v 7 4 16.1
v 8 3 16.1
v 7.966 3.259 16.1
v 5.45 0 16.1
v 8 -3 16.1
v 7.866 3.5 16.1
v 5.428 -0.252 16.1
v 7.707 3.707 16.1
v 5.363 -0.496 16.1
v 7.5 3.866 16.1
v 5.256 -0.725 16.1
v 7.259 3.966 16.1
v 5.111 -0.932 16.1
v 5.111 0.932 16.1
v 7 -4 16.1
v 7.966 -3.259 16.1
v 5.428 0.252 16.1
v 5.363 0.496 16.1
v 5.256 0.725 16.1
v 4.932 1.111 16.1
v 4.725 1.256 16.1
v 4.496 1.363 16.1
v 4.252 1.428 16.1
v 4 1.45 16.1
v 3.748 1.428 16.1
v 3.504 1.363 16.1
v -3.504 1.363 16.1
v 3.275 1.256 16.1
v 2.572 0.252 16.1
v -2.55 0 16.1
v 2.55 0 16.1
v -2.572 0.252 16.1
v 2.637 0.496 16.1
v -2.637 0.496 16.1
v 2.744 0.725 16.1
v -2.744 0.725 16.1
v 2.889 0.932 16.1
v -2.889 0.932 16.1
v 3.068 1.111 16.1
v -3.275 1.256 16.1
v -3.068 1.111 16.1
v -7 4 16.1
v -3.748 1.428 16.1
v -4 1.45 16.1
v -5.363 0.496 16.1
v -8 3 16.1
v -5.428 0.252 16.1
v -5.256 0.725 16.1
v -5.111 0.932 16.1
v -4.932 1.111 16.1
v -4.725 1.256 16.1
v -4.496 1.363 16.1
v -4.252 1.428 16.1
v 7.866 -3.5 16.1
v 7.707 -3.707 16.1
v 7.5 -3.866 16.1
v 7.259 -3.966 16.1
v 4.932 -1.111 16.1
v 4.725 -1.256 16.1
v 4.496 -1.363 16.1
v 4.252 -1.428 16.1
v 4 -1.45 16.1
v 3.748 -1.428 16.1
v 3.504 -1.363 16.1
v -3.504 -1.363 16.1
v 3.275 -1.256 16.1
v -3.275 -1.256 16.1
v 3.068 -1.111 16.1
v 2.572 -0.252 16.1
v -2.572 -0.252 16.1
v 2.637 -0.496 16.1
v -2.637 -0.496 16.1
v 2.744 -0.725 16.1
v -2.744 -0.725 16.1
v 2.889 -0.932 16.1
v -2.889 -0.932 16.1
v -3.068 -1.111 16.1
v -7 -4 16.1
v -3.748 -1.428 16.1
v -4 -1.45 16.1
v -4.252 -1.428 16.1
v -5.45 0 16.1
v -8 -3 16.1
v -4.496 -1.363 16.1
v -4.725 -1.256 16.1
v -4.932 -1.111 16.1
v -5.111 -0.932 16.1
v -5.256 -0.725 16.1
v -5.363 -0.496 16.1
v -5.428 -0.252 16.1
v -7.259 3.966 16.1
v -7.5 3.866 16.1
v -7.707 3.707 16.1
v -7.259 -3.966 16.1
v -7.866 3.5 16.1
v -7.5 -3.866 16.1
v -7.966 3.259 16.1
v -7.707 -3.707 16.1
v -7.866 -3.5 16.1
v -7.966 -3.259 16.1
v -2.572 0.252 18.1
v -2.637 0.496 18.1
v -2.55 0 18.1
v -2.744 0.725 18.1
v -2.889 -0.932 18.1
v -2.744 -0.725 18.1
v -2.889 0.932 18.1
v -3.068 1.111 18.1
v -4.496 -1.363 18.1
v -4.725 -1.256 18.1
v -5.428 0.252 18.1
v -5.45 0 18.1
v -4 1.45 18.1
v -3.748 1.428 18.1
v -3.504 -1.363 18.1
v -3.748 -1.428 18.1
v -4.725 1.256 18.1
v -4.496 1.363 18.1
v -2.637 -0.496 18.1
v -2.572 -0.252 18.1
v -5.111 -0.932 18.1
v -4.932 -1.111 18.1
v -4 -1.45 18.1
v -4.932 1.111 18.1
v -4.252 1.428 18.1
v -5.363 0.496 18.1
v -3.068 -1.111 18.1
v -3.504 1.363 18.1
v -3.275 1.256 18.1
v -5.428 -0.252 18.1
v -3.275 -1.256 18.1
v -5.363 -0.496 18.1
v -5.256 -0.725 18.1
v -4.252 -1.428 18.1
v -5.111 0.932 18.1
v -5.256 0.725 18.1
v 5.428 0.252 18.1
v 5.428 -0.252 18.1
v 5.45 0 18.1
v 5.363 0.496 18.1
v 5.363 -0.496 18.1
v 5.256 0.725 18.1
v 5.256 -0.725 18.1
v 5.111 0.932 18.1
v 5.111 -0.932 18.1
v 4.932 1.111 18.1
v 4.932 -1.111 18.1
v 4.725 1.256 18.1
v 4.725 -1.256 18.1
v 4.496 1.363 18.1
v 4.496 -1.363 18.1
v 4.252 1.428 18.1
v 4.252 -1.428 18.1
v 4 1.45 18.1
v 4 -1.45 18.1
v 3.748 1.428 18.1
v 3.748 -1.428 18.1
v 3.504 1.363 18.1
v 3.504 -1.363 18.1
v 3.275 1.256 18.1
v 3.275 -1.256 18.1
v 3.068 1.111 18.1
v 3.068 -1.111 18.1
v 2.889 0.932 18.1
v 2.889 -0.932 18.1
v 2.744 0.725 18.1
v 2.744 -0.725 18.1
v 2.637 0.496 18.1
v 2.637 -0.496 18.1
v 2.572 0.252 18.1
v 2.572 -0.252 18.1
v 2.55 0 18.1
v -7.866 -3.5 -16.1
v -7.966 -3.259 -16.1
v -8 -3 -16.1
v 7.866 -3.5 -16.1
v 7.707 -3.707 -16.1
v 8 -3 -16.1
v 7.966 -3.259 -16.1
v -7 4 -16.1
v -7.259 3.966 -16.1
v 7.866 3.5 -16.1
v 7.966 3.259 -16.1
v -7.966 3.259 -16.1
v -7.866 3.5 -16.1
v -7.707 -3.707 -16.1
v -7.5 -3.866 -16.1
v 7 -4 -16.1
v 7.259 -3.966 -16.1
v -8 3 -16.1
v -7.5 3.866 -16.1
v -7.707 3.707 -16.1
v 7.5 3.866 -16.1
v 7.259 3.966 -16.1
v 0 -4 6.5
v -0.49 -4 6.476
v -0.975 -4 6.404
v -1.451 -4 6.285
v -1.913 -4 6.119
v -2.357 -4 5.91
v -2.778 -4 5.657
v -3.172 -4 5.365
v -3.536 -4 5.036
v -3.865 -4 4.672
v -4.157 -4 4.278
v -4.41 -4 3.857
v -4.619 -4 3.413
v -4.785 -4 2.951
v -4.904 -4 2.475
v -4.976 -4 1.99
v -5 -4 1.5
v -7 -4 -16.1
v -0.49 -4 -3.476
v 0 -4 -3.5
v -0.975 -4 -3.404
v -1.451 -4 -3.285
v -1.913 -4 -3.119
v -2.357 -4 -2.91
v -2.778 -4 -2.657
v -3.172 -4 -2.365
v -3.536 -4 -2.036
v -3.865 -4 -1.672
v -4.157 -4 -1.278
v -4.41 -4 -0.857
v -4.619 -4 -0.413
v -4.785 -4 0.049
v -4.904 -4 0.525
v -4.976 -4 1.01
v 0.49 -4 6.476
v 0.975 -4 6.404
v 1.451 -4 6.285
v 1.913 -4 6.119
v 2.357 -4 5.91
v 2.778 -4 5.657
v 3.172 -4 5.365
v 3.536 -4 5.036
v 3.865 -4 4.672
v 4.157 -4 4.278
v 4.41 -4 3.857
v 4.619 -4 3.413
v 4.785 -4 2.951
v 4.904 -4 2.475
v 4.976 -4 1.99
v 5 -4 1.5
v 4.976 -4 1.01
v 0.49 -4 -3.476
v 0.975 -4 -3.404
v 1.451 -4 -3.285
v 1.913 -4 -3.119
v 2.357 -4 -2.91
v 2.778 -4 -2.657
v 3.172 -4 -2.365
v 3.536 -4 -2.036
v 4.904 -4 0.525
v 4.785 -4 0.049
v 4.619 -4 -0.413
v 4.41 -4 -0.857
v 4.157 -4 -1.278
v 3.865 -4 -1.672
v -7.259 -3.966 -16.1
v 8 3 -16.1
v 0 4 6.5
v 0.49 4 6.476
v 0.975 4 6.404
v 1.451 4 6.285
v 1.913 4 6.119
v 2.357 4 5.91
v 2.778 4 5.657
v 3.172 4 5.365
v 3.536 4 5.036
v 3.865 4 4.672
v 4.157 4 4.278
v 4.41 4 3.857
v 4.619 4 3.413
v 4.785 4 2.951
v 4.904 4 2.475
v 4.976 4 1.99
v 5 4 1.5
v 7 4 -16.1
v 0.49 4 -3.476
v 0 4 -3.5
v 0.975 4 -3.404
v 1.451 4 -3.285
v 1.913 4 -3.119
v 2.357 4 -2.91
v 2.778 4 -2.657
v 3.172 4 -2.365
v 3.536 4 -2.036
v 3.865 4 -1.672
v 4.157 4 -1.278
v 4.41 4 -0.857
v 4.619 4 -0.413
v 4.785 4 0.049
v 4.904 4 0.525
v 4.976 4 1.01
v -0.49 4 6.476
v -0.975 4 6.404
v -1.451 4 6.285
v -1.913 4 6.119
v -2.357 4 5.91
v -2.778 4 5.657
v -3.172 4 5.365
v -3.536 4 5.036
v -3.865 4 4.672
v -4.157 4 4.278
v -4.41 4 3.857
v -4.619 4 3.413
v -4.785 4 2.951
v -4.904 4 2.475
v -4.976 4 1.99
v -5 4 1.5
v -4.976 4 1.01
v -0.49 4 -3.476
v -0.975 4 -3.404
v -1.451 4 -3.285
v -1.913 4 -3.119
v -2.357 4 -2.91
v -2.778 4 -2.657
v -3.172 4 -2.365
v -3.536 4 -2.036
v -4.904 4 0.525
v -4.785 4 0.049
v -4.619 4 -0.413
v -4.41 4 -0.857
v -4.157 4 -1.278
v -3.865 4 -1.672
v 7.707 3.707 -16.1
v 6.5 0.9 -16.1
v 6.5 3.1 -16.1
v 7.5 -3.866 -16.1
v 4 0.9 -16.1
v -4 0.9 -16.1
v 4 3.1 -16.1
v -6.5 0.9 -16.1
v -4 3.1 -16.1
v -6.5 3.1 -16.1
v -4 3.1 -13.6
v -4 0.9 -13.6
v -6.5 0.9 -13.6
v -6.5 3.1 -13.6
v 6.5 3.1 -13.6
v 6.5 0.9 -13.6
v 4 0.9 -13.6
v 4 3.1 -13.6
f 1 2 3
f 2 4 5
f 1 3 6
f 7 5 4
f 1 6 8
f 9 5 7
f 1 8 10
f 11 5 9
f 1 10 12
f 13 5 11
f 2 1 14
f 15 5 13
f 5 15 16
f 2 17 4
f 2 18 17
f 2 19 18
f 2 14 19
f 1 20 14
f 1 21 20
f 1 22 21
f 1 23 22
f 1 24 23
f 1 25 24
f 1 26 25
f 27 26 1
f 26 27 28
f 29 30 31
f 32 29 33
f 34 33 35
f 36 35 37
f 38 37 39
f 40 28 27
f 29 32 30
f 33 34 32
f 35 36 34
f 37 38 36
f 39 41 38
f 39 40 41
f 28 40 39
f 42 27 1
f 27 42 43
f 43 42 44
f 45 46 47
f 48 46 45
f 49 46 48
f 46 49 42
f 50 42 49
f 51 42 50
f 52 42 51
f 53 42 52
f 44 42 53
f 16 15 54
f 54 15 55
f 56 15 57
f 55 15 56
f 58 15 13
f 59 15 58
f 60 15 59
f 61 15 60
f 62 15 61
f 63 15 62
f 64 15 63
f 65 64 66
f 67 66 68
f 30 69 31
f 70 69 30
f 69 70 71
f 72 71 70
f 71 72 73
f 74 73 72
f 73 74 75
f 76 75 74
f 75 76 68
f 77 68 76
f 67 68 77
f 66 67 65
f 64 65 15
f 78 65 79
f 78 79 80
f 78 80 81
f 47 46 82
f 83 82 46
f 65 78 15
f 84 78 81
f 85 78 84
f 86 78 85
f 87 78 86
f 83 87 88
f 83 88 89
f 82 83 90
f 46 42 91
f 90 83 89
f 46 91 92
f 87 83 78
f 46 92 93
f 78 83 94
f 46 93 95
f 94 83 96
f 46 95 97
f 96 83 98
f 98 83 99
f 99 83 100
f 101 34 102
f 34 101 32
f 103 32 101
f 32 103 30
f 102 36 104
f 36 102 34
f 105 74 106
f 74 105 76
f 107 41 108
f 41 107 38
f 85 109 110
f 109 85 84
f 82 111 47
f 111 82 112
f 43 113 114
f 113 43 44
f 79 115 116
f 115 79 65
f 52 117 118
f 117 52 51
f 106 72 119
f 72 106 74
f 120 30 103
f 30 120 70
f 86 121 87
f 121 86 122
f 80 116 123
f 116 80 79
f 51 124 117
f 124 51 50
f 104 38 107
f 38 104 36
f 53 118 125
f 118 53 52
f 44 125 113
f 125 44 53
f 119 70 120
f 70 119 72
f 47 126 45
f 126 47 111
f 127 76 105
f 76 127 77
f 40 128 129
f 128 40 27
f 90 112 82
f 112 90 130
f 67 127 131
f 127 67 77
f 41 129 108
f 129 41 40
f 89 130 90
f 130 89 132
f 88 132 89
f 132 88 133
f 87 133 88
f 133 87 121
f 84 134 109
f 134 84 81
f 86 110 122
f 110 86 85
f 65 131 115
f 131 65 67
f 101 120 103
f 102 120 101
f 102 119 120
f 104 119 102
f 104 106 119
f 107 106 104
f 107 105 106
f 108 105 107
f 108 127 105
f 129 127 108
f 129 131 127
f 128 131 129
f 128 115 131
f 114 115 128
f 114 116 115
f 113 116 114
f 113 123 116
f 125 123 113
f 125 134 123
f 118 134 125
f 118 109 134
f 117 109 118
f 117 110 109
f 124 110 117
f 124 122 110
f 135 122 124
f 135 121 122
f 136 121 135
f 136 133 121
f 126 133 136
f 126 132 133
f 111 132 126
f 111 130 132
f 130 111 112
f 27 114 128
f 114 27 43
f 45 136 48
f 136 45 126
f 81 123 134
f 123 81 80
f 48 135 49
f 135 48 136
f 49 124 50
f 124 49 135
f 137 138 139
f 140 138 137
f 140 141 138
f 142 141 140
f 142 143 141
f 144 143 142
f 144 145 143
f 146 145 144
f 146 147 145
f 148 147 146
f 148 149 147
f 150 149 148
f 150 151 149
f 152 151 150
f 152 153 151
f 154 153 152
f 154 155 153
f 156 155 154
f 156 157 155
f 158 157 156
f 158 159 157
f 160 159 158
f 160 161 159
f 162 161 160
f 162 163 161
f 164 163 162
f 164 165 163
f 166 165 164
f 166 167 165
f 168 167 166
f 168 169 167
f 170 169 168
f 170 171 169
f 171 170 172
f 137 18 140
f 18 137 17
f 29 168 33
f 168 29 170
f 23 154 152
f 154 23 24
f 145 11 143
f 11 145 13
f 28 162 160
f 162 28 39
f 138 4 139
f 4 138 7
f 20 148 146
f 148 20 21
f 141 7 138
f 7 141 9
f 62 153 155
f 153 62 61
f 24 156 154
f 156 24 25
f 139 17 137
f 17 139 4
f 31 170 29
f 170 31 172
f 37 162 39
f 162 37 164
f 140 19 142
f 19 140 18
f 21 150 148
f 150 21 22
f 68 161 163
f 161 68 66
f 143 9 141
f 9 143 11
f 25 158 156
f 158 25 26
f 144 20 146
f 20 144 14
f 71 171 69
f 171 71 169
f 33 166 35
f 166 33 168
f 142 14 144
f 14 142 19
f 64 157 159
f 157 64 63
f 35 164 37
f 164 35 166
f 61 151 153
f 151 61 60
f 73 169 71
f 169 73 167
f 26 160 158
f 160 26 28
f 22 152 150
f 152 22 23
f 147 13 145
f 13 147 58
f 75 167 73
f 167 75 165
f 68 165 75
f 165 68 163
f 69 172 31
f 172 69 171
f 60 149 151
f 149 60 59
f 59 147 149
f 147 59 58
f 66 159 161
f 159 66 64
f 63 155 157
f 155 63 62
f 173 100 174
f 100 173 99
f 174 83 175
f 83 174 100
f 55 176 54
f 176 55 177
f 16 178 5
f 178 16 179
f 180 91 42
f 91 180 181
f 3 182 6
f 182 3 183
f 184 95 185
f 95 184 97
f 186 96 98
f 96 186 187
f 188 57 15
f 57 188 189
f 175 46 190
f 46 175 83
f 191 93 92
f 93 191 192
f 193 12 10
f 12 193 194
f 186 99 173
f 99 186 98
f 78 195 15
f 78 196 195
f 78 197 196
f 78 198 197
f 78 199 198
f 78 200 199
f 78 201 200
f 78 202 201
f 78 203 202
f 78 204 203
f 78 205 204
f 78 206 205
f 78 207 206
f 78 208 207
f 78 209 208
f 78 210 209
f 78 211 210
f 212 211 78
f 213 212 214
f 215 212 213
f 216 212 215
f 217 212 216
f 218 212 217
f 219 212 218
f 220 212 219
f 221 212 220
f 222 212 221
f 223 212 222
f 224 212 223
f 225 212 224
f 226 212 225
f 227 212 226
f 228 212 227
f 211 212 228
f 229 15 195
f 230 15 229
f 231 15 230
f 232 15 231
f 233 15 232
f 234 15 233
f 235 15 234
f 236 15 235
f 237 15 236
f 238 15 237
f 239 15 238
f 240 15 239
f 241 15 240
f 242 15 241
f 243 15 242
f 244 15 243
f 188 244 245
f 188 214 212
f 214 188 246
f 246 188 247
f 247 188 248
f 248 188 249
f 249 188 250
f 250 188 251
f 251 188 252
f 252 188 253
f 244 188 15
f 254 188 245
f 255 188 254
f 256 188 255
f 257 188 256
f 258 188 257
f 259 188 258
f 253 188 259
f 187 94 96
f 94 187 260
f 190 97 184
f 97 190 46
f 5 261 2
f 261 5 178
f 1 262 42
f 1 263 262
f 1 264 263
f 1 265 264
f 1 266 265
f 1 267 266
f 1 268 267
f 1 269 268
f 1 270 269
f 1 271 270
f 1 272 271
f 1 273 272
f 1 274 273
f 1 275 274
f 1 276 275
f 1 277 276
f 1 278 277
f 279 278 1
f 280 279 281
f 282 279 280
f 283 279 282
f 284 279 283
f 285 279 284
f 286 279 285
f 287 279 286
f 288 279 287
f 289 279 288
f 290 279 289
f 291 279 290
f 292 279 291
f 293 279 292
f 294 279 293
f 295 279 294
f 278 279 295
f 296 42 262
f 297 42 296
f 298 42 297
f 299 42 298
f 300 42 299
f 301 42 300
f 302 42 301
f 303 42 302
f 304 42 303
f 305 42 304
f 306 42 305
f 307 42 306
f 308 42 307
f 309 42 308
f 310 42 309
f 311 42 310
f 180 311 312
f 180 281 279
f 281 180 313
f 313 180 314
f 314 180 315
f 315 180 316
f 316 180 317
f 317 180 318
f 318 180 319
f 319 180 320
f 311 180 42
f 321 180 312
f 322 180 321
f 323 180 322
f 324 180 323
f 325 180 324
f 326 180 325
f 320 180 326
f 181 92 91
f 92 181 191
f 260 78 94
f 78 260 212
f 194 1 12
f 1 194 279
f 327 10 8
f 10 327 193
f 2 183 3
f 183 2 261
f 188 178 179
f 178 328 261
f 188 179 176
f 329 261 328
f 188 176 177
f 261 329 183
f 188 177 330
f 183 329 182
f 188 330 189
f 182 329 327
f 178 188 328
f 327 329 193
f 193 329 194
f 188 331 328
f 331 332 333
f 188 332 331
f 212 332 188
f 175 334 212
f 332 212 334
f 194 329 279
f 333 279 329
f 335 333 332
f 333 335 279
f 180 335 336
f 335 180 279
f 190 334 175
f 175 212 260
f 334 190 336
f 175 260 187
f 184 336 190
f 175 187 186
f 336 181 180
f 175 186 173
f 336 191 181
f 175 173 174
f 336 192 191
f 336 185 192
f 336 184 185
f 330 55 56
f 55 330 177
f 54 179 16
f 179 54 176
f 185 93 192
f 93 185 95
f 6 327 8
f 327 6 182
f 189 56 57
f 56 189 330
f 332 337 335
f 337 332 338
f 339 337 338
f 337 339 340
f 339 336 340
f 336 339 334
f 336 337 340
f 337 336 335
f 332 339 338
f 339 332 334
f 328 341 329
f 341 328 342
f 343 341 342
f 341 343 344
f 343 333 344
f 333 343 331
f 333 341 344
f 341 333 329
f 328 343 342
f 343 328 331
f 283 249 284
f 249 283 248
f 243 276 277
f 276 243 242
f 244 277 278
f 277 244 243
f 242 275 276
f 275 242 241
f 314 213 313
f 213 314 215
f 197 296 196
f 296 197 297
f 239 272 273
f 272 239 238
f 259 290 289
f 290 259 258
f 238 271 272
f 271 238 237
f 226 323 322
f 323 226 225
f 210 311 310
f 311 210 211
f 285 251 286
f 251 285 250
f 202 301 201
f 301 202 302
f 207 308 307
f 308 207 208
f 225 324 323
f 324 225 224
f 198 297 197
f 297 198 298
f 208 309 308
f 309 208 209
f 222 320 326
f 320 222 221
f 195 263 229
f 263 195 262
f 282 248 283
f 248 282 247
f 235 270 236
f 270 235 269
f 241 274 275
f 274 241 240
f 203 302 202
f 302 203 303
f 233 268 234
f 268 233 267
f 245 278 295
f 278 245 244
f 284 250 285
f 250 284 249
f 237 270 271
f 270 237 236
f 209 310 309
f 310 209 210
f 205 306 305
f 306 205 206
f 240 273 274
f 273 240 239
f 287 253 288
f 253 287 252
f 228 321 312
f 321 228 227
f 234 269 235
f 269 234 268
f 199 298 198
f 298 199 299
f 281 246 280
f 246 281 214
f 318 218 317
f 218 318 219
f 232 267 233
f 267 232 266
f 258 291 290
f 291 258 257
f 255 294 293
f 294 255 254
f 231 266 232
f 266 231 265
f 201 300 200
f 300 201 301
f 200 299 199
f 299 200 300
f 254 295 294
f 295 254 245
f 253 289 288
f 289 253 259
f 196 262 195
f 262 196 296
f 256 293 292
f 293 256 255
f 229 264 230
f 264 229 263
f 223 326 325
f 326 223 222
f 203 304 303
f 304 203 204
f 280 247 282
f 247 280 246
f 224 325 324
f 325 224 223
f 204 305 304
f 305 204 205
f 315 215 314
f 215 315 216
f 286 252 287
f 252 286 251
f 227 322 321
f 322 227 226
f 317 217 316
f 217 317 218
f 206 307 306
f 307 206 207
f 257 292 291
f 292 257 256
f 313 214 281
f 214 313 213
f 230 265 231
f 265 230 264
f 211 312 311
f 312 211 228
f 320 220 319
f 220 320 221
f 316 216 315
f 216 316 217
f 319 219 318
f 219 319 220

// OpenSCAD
// Part A4: block with transverse bore and top pins.
// SPDX-License-Identifier: MIT
//
// Local origin convention:
// - XY origin is the body centerline.
// - Z origin is the body midplane, excluding the top pins.
// - Assembly placement and animation should be applied outside this file.

module a4_body_2d(w = 16, d = 8, corner_r = 1.0) {
    // First correction pass: rectangular body with softened corners.
    // End-form contour (R8 callout behavior) can be refined in a later pass.
    hull() {
        for (sx = [-1, 1], sy = [-1, 1])
            translate([sx * (w / 2 - corner_r), sy * (d / 2 - corner_r)])
                circle(r = corner_r, $fn = 24);
    }
}

module part_a4(
    w = 16,
    d = 8,
    body_h = 32.2,
    top_pin_d = 2.9,
    top_pin_h = 2.0,
    pin_spacing = 8.0,
    bore_d = 10.0,
    bore_center_z = 17.6,
    lower_cut_h = 2.5,
    lower_cut_w = 2.5,
    lower_cut_depth = 2.0,
    lower_cut_gap = 8.0,
    corner_r = 1.0
) {
    z_min = -body_h / 2;

    difference() {
        union() {
            // Main block
            translate([0, 0, z_min])
                linear_extrude(height = body_h)
                a4_body_2d(w = w, d = d, corner_r = corner_r);

            // Two top protruding bosses (were incorrectly modeled as holes).
            for (x = [-pin_spacing / 2, pin_spacing / 2])
                translate([x, 0, z_min + body_h])
                    cylinder(d = top_pin_d, h = top_pin_h, center = false, $fn = 36);
        }

        // Main transverse bore (dimension-driven center height).
        translate([0, 0, z_min + bore_center_z])
            rotate([90, 0, 0])
                cylinder(d = bore_d, h = d + 0.4, center = true, $fn = 64);

        // Lower side cutouts (first-pass interpretation of the hidden lower features).
        for (sx = [-1, 1])
            translate([
                sx * (lower_cut_gap / 2 + lower_cut_w / 2),
                d / 2 - lower_cut_depth,
                z_min + lower_cut_h / 2
            ])
                cube([lower_cut_w, lower_cut_depth + 0.2, lower_cut_h], center = true);
    }
}


// ---- "main guard" ----
// Default to previewing when opened directly:
if (is_undef(__LIB_MODE__)) {
    part_a4();
}
